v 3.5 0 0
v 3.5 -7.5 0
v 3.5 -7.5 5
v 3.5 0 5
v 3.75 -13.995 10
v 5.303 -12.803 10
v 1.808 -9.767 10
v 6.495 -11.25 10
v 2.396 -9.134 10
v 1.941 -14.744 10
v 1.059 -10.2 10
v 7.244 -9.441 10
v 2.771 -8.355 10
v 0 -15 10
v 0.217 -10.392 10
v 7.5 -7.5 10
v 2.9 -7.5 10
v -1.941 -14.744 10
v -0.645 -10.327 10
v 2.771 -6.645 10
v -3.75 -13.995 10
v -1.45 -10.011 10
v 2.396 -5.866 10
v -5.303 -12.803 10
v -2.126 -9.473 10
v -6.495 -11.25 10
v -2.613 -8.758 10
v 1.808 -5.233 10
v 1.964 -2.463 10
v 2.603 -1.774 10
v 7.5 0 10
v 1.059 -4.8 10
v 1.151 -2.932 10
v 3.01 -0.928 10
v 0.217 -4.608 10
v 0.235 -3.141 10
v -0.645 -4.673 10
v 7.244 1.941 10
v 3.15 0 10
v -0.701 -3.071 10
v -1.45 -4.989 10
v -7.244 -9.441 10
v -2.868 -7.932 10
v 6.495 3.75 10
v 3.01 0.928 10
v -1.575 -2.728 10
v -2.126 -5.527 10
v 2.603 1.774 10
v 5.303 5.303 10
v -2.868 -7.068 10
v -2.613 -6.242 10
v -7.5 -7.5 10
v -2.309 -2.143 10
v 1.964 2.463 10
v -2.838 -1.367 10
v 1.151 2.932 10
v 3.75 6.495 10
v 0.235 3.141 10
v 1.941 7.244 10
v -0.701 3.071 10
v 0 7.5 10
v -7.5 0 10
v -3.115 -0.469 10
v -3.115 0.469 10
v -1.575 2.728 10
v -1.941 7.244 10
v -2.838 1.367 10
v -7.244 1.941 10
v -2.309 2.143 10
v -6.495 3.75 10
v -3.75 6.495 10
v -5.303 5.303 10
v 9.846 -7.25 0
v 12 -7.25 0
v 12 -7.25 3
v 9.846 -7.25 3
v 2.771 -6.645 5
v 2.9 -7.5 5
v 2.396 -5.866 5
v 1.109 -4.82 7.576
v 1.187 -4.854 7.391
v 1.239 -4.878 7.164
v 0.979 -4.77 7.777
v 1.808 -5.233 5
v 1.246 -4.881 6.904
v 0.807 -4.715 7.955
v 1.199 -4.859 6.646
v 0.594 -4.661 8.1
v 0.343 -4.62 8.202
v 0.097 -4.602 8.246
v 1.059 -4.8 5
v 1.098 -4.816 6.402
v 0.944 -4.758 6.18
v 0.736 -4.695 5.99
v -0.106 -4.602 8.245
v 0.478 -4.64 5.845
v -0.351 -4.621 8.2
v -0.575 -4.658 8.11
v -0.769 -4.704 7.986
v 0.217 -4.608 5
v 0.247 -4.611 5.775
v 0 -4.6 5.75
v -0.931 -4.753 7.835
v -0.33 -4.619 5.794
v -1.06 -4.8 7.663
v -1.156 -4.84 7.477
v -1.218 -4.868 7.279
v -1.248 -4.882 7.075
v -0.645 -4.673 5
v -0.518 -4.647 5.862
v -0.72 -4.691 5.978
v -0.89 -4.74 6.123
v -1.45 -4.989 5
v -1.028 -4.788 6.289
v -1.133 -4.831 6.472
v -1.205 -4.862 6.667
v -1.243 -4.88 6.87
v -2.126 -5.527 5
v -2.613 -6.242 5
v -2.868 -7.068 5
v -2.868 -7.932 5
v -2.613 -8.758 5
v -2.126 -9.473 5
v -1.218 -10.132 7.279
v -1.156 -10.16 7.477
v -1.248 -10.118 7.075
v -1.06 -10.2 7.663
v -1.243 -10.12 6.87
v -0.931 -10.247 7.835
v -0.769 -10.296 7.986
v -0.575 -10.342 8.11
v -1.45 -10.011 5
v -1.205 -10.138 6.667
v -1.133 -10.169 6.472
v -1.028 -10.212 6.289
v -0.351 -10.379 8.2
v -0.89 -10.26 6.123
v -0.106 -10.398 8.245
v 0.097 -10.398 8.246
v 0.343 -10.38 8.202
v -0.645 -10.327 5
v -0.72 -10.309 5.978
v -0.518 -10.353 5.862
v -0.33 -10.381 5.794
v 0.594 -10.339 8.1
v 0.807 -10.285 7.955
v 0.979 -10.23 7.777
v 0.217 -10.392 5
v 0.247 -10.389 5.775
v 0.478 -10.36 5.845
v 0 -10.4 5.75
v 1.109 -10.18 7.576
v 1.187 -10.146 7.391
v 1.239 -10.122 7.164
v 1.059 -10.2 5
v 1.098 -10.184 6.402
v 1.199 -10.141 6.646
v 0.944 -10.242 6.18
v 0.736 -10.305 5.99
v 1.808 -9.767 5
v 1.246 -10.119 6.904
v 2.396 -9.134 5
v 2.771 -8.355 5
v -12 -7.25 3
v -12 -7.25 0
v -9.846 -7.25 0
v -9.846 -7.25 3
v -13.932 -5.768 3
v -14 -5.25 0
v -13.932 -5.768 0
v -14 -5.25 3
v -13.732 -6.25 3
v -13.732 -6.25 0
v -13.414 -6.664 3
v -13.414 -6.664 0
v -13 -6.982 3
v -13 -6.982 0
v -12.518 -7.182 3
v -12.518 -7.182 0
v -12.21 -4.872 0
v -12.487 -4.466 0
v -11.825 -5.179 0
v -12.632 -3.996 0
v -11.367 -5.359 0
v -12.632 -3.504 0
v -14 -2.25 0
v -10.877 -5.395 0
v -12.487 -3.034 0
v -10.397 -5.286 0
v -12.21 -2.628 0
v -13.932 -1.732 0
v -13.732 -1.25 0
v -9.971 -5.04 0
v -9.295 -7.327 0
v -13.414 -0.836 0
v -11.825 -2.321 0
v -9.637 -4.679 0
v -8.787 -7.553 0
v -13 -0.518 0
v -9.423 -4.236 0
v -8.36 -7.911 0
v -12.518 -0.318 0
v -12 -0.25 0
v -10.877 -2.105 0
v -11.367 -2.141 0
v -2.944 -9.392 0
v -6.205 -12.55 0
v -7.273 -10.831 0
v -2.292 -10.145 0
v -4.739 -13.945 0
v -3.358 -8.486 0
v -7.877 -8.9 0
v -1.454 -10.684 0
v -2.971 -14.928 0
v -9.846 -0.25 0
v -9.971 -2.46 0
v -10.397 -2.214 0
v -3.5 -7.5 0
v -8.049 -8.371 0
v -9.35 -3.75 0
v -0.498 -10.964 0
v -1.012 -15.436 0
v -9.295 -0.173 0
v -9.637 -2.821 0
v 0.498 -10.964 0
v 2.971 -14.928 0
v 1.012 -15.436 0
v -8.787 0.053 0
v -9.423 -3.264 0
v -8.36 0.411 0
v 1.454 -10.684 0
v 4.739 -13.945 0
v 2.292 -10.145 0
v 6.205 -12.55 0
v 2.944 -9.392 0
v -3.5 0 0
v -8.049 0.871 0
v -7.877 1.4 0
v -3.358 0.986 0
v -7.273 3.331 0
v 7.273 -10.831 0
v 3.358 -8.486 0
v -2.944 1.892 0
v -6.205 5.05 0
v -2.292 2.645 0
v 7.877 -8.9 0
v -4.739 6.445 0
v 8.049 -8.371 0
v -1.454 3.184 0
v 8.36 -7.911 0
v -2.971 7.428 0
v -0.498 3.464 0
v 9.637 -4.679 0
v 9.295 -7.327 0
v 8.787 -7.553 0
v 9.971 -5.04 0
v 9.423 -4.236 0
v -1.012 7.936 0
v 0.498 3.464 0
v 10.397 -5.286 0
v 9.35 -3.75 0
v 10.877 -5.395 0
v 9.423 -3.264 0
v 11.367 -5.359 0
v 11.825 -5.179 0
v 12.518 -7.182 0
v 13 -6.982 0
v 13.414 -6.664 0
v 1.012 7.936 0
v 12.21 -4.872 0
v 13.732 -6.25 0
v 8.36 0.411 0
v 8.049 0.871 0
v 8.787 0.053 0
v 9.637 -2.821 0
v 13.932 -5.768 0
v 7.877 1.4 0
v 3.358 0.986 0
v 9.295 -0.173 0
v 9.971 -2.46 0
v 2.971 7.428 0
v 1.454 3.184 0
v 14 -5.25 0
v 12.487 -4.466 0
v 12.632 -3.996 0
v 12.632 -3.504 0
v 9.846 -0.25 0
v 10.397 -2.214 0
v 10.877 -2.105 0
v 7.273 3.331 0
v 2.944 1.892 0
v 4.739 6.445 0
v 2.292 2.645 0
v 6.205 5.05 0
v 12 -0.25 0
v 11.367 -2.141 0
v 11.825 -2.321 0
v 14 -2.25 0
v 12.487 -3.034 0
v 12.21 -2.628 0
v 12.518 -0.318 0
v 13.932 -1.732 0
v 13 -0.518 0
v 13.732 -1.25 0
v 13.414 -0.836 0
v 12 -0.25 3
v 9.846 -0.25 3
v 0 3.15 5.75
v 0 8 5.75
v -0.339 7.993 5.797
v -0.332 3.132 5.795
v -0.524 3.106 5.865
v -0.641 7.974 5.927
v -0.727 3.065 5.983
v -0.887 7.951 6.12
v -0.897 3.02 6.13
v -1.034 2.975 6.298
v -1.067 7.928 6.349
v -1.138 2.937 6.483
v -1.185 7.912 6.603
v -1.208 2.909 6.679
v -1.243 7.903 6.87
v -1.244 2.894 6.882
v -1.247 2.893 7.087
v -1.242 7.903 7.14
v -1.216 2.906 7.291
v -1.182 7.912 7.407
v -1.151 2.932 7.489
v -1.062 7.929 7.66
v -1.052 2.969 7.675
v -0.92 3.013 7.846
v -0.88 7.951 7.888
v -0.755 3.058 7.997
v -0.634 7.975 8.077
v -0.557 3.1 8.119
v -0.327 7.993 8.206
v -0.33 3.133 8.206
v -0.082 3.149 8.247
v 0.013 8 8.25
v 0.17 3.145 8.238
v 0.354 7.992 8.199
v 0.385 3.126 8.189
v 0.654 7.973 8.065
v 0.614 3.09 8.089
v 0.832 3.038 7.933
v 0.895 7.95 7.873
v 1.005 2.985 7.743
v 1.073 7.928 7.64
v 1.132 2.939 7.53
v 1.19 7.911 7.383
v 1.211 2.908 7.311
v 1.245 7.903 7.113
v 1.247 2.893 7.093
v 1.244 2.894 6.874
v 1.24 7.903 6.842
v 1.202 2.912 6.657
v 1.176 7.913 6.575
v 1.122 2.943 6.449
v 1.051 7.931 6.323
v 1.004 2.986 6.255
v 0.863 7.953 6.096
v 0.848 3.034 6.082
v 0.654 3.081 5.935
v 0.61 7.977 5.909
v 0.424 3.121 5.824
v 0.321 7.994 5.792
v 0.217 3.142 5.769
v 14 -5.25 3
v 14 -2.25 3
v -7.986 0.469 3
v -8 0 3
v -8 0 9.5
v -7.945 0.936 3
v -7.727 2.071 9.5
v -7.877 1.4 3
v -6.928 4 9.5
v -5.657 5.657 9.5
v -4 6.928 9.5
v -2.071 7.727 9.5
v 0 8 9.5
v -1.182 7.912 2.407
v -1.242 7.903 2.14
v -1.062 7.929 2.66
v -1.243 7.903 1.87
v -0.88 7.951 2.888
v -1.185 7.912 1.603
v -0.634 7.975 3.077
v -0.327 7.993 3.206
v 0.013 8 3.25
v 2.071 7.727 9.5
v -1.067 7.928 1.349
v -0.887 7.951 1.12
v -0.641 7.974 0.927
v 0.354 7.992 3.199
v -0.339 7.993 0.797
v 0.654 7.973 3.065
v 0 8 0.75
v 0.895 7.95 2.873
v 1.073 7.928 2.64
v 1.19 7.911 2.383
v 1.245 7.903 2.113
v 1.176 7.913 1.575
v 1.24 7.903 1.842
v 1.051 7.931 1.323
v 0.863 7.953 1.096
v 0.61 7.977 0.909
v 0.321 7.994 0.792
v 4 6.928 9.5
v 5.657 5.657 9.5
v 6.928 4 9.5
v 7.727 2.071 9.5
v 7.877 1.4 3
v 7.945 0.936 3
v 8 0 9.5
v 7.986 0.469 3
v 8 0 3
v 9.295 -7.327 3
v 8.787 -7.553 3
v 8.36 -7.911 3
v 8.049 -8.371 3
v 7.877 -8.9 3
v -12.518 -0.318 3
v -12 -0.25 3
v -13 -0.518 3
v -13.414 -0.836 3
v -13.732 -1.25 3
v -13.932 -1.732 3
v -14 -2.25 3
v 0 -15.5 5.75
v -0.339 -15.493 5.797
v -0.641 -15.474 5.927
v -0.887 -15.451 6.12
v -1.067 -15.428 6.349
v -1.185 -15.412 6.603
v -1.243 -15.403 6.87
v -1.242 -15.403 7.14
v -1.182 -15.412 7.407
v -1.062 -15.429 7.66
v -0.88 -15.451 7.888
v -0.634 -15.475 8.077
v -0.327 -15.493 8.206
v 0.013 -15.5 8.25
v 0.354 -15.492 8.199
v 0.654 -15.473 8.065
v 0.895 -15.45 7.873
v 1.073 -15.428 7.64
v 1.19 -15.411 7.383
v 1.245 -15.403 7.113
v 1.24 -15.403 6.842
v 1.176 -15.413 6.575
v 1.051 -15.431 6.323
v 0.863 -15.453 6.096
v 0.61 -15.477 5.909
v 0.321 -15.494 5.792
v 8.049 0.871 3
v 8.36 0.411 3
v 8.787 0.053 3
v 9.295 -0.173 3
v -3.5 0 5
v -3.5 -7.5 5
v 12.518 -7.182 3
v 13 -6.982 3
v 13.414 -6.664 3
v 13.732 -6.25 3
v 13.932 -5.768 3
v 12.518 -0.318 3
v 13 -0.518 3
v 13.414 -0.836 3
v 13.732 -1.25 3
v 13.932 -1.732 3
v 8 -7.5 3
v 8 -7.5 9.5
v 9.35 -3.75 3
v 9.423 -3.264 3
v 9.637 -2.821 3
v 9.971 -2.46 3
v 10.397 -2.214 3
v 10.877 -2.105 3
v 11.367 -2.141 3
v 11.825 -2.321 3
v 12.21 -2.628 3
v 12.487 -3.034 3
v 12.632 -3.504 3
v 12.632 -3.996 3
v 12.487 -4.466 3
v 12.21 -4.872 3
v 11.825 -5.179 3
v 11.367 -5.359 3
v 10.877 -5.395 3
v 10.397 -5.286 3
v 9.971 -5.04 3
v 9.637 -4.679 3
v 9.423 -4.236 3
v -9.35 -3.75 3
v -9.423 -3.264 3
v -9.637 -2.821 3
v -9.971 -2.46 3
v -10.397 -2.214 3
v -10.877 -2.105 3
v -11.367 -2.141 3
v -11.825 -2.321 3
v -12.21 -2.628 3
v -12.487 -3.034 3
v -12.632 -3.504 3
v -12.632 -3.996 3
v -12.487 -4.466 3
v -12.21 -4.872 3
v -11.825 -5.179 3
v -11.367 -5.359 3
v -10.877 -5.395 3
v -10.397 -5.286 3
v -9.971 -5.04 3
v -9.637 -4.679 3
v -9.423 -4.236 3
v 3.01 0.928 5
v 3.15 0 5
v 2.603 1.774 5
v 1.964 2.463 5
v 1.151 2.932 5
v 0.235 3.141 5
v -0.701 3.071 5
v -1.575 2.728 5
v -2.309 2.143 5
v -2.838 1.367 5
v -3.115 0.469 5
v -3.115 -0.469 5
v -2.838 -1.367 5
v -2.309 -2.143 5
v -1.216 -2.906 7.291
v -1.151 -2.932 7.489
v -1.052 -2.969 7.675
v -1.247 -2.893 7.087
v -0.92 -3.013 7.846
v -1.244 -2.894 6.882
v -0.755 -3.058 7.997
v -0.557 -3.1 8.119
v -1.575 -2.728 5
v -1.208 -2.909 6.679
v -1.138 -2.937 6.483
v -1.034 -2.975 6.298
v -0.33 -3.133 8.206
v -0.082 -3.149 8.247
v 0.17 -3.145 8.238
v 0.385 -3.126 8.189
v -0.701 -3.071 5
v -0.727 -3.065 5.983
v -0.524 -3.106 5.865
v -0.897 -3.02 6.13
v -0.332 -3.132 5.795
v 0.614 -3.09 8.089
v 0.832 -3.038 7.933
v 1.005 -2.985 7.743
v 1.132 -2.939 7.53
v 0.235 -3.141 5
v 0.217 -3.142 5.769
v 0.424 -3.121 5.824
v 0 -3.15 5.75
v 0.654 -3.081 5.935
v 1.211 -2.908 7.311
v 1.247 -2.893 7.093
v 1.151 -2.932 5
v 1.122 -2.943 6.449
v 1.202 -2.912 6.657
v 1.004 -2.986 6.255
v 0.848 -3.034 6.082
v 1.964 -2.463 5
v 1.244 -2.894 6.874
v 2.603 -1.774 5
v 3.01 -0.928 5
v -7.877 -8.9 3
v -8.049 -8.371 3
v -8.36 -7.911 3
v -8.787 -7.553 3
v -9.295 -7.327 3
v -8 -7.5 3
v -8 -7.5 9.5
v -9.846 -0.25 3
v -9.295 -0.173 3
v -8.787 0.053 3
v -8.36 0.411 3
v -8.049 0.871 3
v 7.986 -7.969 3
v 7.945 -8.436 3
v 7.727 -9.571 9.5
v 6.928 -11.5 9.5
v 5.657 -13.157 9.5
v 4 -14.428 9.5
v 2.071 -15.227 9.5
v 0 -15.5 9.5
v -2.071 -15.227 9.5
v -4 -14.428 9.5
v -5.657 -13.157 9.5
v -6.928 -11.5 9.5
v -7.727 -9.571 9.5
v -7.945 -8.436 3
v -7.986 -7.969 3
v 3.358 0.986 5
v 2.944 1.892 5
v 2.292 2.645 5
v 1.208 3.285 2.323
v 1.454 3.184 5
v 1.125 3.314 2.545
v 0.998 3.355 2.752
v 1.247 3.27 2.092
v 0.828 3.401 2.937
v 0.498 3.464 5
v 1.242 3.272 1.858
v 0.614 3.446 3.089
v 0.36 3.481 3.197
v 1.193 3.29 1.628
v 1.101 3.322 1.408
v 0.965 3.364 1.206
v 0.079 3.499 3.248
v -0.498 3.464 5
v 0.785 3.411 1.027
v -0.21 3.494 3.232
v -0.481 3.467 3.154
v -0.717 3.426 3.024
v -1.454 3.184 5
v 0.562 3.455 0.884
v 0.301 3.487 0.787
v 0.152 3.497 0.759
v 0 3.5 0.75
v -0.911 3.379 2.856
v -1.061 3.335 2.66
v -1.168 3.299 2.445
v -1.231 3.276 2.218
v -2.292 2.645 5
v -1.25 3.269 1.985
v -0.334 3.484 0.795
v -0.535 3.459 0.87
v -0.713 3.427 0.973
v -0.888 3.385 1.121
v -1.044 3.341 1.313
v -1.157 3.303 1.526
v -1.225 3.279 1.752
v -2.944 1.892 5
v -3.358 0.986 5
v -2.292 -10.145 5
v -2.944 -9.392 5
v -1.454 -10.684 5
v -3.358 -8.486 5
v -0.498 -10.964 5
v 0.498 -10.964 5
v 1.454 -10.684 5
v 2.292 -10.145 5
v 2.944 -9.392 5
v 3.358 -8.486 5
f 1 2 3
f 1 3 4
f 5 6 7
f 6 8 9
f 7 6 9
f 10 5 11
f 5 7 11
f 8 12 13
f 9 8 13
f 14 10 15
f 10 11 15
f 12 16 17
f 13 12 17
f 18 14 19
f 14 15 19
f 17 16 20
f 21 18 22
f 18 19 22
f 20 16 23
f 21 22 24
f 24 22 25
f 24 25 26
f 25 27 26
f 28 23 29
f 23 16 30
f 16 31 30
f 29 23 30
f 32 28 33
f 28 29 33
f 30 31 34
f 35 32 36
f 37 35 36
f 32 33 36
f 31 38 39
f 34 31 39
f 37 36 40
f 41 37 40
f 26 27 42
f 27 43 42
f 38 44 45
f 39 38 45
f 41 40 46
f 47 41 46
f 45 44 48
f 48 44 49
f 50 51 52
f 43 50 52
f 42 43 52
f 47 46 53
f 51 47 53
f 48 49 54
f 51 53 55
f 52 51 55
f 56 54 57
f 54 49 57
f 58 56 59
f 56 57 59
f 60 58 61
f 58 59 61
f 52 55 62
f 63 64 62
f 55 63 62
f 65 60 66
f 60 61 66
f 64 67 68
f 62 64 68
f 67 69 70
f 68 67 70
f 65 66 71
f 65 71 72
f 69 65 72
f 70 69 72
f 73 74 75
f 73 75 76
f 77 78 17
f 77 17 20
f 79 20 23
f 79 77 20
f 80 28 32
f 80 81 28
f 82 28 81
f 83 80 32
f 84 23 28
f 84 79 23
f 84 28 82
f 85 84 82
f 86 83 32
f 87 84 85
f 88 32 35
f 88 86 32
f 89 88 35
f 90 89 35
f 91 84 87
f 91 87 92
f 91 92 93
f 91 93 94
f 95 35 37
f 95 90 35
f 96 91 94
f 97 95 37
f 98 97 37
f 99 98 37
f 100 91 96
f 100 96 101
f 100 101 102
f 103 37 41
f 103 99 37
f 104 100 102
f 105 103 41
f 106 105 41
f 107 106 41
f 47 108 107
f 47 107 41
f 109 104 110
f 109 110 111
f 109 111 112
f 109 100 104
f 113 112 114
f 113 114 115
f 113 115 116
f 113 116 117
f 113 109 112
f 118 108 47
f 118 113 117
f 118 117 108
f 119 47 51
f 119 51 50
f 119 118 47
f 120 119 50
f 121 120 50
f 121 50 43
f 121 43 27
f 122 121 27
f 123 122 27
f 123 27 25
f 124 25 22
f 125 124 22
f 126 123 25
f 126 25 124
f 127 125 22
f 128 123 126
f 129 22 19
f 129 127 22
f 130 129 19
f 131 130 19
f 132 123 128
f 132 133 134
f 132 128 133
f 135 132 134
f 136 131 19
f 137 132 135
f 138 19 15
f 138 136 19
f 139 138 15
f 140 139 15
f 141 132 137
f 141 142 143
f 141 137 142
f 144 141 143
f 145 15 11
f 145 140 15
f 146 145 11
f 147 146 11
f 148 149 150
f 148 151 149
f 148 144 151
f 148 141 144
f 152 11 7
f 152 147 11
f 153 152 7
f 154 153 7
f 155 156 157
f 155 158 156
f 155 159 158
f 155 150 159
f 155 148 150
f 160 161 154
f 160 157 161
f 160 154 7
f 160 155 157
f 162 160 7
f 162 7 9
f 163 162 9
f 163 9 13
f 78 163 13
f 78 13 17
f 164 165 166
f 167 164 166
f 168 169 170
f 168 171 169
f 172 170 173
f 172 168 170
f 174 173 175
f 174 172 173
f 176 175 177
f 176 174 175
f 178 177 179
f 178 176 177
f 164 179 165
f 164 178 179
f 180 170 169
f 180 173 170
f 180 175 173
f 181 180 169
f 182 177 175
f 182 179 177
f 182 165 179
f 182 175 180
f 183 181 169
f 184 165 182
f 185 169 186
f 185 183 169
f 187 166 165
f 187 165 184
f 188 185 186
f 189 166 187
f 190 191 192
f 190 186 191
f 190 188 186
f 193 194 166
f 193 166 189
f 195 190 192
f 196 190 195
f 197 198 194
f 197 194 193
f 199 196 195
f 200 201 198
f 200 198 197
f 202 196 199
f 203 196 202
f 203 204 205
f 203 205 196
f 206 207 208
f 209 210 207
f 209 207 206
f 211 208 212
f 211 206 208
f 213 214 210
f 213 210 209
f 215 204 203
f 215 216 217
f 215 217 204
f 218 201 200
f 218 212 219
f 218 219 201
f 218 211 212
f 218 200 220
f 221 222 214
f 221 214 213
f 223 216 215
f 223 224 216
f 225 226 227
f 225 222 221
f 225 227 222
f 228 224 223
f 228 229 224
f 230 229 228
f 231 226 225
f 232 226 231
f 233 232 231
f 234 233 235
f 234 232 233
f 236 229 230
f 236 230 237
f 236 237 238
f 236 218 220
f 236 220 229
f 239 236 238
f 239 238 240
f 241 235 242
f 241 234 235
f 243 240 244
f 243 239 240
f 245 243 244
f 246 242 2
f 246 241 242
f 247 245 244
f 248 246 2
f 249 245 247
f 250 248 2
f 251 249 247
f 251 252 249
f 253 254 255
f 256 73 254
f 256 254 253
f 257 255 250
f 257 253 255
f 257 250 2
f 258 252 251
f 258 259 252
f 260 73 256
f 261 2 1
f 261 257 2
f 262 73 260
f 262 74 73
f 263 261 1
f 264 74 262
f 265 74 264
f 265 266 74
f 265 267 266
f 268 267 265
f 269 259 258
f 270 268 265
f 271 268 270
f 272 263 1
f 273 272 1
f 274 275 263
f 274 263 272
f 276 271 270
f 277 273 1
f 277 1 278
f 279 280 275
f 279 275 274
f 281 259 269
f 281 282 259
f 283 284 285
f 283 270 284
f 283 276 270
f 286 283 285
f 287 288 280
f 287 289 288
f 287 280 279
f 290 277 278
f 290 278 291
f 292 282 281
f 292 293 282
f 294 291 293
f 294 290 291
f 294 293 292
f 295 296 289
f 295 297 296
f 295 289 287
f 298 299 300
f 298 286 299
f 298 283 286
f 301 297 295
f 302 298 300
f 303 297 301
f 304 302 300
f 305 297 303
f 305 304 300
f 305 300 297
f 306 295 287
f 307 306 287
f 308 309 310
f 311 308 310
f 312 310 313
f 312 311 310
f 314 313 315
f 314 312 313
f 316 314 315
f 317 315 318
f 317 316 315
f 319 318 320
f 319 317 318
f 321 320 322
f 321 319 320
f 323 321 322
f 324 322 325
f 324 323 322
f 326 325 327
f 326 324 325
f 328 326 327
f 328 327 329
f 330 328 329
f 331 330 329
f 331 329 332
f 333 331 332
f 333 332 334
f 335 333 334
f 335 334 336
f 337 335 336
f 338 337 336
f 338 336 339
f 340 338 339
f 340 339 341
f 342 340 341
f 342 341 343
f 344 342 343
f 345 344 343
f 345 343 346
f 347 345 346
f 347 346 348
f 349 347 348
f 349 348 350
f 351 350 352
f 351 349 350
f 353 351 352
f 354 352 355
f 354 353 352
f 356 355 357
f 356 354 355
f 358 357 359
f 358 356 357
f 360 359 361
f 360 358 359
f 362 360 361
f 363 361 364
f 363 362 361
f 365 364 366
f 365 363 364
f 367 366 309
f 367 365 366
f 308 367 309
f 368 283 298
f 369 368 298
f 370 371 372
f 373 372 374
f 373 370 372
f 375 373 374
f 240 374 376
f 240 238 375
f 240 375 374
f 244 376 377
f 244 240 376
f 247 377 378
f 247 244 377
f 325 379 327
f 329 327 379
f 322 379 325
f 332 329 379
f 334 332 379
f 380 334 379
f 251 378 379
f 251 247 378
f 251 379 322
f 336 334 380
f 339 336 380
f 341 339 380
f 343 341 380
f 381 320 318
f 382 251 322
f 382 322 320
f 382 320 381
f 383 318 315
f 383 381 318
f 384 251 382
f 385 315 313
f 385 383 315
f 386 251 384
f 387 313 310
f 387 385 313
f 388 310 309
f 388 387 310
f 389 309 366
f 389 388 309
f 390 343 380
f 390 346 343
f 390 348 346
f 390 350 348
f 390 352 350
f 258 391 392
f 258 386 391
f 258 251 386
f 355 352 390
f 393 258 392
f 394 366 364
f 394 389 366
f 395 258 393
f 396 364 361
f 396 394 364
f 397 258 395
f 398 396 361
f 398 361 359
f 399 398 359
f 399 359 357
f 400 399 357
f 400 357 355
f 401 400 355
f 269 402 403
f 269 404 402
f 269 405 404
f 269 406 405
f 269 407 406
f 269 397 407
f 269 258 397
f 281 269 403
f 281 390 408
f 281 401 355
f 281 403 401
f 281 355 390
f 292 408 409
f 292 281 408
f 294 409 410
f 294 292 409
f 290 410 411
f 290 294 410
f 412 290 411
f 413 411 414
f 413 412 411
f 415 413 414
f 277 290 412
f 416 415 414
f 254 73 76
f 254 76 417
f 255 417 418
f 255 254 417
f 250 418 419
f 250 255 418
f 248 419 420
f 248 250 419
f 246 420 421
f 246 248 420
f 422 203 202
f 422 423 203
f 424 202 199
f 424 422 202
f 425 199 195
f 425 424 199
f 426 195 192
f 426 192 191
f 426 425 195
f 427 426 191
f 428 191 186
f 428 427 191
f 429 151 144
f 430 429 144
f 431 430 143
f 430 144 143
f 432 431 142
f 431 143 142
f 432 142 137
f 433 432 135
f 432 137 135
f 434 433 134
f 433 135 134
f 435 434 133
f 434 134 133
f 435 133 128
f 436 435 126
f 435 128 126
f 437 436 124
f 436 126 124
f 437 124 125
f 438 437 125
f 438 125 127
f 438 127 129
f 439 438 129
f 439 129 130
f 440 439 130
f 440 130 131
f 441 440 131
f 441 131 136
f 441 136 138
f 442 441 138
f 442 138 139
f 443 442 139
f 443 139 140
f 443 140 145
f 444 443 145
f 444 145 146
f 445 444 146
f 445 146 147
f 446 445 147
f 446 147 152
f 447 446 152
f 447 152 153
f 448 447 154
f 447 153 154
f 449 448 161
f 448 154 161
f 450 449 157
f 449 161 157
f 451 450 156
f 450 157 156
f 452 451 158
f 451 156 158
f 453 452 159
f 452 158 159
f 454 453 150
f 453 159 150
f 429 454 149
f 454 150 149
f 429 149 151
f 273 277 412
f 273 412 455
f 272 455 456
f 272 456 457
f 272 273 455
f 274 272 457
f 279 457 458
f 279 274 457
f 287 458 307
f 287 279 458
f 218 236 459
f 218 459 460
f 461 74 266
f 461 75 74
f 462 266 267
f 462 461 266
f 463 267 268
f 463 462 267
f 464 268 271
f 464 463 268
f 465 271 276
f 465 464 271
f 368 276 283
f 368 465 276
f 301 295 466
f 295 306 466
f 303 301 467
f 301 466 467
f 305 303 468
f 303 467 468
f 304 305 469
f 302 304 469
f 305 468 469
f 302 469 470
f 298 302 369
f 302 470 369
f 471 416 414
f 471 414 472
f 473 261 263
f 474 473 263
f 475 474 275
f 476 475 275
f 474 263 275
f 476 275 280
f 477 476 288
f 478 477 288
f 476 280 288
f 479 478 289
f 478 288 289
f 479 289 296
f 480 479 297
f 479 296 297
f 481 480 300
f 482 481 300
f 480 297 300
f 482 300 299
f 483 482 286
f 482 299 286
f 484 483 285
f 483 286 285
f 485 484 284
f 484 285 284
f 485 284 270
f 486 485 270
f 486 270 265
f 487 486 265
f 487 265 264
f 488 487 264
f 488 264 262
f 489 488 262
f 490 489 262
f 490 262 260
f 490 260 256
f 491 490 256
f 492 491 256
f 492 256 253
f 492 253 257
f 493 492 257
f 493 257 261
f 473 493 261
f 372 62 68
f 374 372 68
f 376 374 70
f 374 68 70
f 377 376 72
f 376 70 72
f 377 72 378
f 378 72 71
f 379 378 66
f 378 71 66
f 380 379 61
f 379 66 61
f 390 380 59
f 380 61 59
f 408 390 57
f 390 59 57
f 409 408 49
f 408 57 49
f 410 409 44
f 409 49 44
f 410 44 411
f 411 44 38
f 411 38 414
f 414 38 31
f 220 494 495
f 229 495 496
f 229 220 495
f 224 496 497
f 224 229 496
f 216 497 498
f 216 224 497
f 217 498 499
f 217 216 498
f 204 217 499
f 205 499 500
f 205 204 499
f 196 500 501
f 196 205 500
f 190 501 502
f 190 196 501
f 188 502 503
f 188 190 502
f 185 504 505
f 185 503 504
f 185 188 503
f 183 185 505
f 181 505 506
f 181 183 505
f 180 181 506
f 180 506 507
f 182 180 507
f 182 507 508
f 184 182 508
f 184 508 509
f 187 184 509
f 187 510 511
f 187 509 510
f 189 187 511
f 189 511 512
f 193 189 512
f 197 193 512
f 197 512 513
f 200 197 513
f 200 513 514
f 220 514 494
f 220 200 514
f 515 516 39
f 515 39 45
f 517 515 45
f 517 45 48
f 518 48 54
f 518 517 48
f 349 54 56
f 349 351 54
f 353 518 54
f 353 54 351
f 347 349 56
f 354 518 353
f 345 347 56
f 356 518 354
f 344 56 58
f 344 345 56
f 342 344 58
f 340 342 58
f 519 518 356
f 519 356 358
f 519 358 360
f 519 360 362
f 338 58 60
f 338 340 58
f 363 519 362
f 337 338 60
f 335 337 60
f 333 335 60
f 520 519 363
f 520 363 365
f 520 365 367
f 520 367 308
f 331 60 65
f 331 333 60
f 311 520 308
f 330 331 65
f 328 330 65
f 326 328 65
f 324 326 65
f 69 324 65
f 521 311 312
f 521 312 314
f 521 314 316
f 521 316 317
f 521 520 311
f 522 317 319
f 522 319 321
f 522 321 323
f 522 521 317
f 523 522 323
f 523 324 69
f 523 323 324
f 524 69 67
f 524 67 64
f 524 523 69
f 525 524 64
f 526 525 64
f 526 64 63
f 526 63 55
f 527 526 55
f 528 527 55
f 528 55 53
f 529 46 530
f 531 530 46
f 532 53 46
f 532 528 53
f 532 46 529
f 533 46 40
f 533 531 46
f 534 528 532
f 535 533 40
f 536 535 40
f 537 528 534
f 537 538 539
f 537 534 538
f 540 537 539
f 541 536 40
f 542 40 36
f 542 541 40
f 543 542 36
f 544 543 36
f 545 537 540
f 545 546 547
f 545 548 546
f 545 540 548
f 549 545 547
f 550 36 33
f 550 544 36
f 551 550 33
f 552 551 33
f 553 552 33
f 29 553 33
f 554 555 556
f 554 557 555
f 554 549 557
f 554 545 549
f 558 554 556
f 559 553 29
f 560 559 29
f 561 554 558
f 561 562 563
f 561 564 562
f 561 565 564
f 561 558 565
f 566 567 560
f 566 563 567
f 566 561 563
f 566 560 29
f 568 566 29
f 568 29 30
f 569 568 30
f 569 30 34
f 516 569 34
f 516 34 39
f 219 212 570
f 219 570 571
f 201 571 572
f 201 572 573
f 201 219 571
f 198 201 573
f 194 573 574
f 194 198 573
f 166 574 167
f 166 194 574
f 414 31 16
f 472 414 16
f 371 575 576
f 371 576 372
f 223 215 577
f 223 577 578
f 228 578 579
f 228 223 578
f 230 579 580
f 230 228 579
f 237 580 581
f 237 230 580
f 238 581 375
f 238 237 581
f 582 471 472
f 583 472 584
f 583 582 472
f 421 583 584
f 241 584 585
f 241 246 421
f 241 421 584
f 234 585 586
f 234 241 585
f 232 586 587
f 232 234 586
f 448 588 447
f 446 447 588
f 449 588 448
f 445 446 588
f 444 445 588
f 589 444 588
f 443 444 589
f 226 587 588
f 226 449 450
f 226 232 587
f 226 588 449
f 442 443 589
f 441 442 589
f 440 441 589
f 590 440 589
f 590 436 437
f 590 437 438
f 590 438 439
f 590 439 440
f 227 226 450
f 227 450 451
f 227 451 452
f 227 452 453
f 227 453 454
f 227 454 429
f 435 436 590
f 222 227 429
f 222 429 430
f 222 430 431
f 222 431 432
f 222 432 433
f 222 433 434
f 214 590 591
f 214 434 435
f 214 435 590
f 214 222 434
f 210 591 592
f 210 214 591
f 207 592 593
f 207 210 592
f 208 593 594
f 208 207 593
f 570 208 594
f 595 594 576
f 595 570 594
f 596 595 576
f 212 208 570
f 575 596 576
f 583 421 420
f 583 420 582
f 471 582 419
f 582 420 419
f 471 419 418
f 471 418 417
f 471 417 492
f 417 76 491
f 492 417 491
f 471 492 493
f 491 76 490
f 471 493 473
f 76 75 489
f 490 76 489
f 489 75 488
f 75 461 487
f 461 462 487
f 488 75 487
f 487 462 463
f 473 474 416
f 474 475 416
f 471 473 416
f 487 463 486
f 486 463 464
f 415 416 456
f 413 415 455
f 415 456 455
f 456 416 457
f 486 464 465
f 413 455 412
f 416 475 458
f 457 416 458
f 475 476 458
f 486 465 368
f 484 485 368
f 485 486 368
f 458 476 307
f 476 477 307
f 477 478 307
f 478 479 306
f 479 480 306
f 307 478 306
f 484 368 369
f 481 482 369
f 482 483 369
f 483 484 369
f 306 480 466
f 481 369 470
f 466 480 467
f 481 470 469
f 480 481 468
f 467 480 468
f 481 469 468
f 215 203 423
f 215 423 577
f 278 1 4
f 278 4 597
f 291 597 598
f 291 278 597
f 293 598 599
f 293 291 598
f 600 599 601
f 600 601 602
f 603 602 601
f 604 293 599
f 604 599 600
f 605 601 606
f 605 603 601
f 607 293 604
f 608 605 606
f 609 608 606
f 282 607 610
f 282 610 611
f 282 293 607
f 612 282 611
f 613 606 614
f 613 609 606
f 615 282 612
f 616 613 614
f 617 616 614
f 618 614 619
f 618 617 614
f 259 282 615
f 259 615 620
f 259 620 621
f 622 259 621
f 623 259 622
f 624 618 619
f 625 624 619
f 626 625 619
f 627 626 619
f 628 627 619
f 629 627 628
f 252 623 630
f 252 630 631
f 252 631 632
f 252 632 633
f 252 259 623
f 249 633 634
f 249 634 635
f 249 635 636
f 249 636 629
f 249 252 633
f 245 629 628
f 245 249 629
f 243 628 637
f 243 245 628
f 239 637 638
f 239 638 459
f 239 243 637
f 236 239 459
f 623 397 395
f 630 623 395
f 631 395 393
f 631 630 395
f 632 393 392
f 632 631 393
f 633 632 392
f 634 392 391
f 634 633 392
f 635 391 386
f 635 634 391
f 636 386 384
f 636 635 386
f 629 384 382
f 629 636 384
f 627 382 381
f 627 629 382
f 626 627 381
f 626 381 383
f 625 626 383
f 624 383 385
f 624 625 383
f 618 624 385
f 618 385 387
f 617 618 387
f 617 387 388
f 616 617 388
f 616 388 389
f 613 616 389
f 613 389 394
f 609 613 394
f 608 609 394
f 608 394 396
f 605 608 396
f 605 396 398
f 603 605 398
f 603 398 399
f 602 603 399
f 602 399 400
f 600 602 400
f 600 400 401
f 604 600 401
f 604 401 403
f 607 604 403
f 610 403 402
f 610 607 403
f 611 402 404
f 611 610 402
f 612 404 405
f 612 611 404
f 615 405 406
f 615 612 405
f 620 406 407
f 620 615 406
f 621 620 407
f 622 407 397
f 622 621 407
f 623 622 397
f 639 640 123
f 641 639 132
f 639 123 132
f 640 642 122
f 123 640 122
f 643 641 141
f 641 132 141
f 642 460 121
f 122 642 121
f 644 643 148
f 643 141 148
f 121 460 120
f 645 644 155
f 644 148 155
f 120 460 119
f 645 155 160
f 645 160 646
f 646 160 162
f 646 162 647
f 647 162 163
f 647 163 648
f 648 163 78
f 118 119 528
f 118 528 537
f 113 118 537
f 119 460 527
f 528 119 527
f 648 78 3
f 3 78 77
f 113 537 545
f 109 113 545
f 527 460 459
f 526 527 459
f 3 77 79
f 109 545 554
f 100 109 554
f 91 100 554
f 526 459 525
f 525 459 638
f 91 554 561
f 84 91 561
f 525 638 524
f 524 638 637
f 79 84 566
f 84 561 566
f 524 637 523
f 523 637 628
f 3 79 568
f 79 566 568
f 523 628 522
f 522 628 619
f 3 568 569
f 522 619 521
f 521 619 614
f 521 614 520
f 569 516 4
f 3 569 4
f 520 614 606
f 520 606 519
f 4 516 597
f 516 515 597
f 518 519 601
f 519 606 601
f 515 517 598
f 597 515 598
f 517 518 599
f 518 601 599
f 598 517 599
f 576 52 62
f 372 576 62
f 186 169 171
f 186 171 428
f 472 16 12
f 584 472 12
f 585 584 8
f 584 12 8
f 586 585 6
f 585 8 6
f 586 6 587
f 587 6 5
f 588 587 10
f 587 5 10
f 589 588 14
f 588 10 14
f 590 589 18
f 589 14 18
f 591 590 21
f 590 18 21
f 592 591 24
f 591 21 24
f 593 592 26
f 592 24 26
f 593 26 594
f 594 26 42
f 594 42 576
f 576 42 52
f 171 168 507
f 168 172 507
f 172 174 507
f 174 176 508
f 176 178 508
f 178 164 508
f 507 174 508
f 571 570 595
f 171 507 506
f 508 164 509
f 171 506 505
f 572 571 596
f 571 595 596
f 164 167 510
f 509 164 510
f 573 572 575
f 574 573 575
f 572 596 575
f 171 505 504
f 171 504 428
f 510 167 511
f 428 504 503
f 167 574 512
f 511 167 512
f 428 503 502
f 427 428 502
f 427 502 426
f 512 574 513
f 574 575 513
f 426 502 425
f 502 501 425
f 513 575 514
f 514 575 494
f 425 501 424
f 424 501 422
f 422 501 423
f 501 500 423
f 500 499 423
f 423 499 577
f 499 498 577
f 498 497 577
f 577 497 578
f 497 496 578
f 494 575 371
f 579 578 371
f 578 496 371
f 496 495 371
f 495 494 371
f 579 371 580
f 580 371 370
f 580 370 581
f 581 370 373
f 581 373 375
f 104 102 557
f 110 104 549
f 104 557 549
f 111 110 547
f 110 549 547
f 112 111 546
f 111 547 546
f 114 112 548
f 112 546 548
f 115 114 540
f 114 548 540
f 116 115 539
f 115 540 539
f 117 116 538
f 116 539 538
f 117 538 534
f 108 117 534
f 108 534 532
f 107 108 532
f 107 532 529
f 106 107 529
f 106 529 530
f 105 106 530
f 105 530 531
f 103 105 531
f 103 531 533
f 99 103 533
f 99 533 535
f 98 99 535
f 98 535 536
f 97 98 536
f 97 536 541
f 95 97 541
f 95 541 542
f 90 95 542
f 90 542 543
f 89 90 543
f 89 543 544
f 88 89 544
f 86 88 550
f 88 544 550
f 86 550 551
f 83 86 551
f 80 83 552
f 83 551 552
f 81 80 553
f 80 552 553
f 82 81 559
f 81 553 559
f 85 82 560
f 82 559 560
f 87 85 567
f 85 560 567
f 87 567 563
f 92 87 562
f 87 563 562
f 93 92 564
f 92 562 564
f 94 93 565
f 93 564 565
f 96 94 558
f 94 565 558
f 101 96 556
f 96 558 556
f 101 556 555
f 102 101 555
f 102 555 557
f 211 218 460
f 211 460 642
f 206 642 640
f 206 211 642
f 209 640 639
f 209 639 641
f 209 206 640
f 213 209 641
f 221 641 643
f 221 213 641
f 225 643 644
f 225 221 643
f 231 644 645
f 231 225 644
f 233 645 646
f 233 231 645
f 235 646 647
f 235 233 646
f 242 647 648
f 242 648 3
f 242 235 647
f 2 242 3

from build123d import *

# Parameters (mm, degrees)
SKETCH1_R            = 3.15
SKETCH1_R_2          = 2.9
BOSS_EXTRUDE1_DEPTH  = 10
SKETCH2_R            = 1.25
CUT_EXTRUDE1_DEPTH   = 21.105969263
CHAMFER1_SIZE        = 0.5
SKETCH3_R            = 1.25
CUT_EXTRUDE2_DEPTH   = 21.105969352
SKETCH4_W            = 6
SKETCH4_H            = 7
BOSS_EXTRUDE2_DEPTH  = 3
SKETCH5_R            = 1.65
CUT_EXTRUDE3_DEPTH   = 24.157072484
FILLET1_R            = 2
FILLET1_OF_MIRROR1_R = 2
FILLET2_R            = 2
CUT_EXTRUDE4_DEPTH   = 5


with BuildPart() as part:
    # Sketch1 → Boss-Extrude1 (new body)
    with BuildSketch(Plane.XY):
        with BuildLine():
            Line((8, 0), (8, -7.5))
            ThreePointArc((8, -7.5), (0, -15.5), (-8, -7.5))
            Line((-8, -7.5), (-8, 0))
            ThreePointArc((-8, 0), (0, 8), (8, 0))
        make_face()
        Circle(SKETCH1_R, mode=Mode.SUBTRACT)
        with Locations((0, -7.5)):
            Circle(SKETCH1_R_2, mode=Mode.SUBTRACT)
    extrude(amount=BOSS_EXTRUDE1_DEPTH)

    # Sketch2 → Cut-Extrude1 (cut, through all)
    with BuildSketch(Plane(origin=(0, 0, 0), x_dir=(1, 0, 0), z_dir=(0, 1, 0))):
        with Locations(Location((0, -2, 0), (0, 0, 90))):
            Circle(SKETCH2_R)
        with Locations(Location((0, -7, 0), (0, 0, 90))):
            Circle(SKETCH2_R)
    extrude(amount=CUT_EXTRUDE1_DEPTH, mode=Mode.SUBTRACT)

    # Chamfer1
    chamfer1_edges = [part.edges().sort_by_distance(p)[0] for p in [
        (0, -15.5, 10),
        (8, -3.75, 10),
        (0, 8, 10),
        (-8, -3.75, 10),
    ]]
    chamfer(chamfer1_edges, length=CHAMFER1_SIZE)

    # Sketch3 → Cut-Extrude2 (cut, through all)
    with BuildSketch(Plane(origin=(0, 0, 0), x_dir=(1, 0, 0), z_dir=(0, 1, 0))):
        with Locations(Location((0, -7, 0), (0, 0, 90))):
            Circle(SKETCH3_R)
    extrude(amount=-CUT_EXTRUDE2_DEPTH, mode=Mode.SUBTRACT)

    # Sketch4 → Boss-Extrude2 (add)
    with BuildSketch(Plane(origin=(0, 0, 0), x_dir=(-1, 0, 0), z_dir=(0, 0, -1))):
        with Locations((-11, -3.75)):
            Rectangle(SKETCH4_W, SKETCH4_H)
    boss_extrude2 = extrude(amount=-BOSS_EXTRUDE2_DEPTH)

    # Sketch5 → Cut-Extrude3 (cut, through all)
    with BuildSketch(Plane(origin=(0, 0, 0), x_dir=(-1, 0, 0), z_dir=(0, 0, -1))):
        with Locations((-11, -3.75)):
            Circle(SKETCH5_R)
    cut_extrude3 = extrude(amount=-CUT_EXTRUDE3_DEPTH, mode=Mode.SUBTRACT)

    # Fillet1
    fillet1_edges = [part.edges().sort_by_distance(p)[0] for p in [
        (14, -7.25, 1.5),
        (14, -0.25, 1.5),
    ]]
    fillet(fillet1_edges, radius=FILLET1_R)

    # Mirror1: Boss-Extrude2, Cut-Extrude3 across plane
    add(boss_extrude2.mirror(Plane(origin=(0, 0, 0), x_dir=(0, 0, 1), z_dir=(1, 0, 0))))
    add(cut_extrude3.mirror(Plane(origin=(0, 0, 0), x_dir=(0, 0, 1), z_dir=(1, 0, 0))), mode=Mode.SUBTRACT)

    # Fillet1 of Mirror1
    fillet1_of_mirror1_edges = [part.edges().sort_by_distance(p)[0] for p in [
        (-14, -7.25, 1.5),
        (-14, -0.25, 1.5),
    ]]
    fillet(fillet1_of_mirror1_edges, radius=FILLET1_OF_MIRROR1_R)

    # Fillet2
    # the kernel refuses this fillet: 2 mm, written as the material it adds along each edge
    with BuildSketch(Plane(origin=(-8, -0.25, 0), x_dir=(-1, 0, 0), z_dir=(0, 0, 1))) as fillet2_piece_1:
        with BuildLine():
            CenterArc((1.845684334, -2), FILLET2_R, 90, 79.921341892)
            Line((-0.123452533, -1.65), (-0.32036622, -1.615))
            ThreePointArc((-0.32036622, -1.615), (-0.2, -0.25), (-0.2, 0))
            Line((-0.2, 0), (0, 0.2))
            Line((0, 0.2), (1.845684334, 0.2))
            Line((1.845684334, 0.2), (1.845684334, 0))
        make_face()
    extrude(amount=3)
    with BuildSketch(Plane(origin=(-8, -7.25, 0), x_dir=(0.07461117211724091, -0.9972127019825267, 0), z_dir=(0, 0, 1)), Plane(origin=(8, -0.25, 0), x_dir=(-0.07461117211724083, 0.9972127019825267, 0), z_dir=(0, 0, 1))) as fillet2_piece_2:
        with BuildLine():
            CenterArc((1.856716732, -1.989762206), FILLET2_R, 95.799776596, 79.921341892)
            Line((-0.137708672, -1.840539861), (-0.337151212, -1.825617627))
            Line((-0.337151212, -1.825617627), (-0.19944254, 0.014922234))
            Line((-0.19944254, 0.014922234), (0.014922234, 0.19944254))
            ThreePointArc((0.014922234, 0.19944254), (0.26422541, 0.180789747), (1.634401413, 0.198976221))
            Line((1.634401413, 0.198976221), (1.654611896, 0))
        make_face()
    extrude(amount=3)
    with BuildSketch(Plane(origin=(8, -7.25, 0), x_dir=(-0.07461117211724076, -0.9972127019825267, 0), z_dir=(0, 0, 1))) as fillet2_piece_3:
        with BuildLine():
            CenterArc((1.856716732, 1.989762206), FILLET2_R, 184.278881512, 79.921341892)
            Line((-0.137708672, 1.840539861), (-0.337151212, 1.825617627))
            Line((-0.337151212, 1.825617627), (-0.19944254, -0.014922234))
            Line((-0.19944254, -0.014922234), (0.014922234, -0.19944254))
            ThreePointArc((0.014922234, -0.19944254), (0.26422541, -0.180789747), (1.634401413, -0.198976221))
            Line((1.634401413, -0.198976221), (1.654611896, 0))
        make_face()
    extrude(amount=3)

    # Sketch6 → Cut-Extrude4 (cut)
    with BuildSketch(Plane(origin=(0, 0, 0), x_dir=(-1, 0, 0), z_dir=(0, 0, -1))):
        with BuildLine():
            Line((3.5, 0), (3.5, -7.5))
            ThreePointArc((3.5, -7.5), (0, -11), (-3.5, -7.5))
            Line((-3.5, -7.5), (-3.5, 0))
            ThreePointArc((-3.5, 0), (0, 3.5), (3.5, 0))
        make_face()
    extrude(amount=-CUT_EXTRUDE4_DEPTH, mode=Mode.SUBTRACT)


solid = part.part
